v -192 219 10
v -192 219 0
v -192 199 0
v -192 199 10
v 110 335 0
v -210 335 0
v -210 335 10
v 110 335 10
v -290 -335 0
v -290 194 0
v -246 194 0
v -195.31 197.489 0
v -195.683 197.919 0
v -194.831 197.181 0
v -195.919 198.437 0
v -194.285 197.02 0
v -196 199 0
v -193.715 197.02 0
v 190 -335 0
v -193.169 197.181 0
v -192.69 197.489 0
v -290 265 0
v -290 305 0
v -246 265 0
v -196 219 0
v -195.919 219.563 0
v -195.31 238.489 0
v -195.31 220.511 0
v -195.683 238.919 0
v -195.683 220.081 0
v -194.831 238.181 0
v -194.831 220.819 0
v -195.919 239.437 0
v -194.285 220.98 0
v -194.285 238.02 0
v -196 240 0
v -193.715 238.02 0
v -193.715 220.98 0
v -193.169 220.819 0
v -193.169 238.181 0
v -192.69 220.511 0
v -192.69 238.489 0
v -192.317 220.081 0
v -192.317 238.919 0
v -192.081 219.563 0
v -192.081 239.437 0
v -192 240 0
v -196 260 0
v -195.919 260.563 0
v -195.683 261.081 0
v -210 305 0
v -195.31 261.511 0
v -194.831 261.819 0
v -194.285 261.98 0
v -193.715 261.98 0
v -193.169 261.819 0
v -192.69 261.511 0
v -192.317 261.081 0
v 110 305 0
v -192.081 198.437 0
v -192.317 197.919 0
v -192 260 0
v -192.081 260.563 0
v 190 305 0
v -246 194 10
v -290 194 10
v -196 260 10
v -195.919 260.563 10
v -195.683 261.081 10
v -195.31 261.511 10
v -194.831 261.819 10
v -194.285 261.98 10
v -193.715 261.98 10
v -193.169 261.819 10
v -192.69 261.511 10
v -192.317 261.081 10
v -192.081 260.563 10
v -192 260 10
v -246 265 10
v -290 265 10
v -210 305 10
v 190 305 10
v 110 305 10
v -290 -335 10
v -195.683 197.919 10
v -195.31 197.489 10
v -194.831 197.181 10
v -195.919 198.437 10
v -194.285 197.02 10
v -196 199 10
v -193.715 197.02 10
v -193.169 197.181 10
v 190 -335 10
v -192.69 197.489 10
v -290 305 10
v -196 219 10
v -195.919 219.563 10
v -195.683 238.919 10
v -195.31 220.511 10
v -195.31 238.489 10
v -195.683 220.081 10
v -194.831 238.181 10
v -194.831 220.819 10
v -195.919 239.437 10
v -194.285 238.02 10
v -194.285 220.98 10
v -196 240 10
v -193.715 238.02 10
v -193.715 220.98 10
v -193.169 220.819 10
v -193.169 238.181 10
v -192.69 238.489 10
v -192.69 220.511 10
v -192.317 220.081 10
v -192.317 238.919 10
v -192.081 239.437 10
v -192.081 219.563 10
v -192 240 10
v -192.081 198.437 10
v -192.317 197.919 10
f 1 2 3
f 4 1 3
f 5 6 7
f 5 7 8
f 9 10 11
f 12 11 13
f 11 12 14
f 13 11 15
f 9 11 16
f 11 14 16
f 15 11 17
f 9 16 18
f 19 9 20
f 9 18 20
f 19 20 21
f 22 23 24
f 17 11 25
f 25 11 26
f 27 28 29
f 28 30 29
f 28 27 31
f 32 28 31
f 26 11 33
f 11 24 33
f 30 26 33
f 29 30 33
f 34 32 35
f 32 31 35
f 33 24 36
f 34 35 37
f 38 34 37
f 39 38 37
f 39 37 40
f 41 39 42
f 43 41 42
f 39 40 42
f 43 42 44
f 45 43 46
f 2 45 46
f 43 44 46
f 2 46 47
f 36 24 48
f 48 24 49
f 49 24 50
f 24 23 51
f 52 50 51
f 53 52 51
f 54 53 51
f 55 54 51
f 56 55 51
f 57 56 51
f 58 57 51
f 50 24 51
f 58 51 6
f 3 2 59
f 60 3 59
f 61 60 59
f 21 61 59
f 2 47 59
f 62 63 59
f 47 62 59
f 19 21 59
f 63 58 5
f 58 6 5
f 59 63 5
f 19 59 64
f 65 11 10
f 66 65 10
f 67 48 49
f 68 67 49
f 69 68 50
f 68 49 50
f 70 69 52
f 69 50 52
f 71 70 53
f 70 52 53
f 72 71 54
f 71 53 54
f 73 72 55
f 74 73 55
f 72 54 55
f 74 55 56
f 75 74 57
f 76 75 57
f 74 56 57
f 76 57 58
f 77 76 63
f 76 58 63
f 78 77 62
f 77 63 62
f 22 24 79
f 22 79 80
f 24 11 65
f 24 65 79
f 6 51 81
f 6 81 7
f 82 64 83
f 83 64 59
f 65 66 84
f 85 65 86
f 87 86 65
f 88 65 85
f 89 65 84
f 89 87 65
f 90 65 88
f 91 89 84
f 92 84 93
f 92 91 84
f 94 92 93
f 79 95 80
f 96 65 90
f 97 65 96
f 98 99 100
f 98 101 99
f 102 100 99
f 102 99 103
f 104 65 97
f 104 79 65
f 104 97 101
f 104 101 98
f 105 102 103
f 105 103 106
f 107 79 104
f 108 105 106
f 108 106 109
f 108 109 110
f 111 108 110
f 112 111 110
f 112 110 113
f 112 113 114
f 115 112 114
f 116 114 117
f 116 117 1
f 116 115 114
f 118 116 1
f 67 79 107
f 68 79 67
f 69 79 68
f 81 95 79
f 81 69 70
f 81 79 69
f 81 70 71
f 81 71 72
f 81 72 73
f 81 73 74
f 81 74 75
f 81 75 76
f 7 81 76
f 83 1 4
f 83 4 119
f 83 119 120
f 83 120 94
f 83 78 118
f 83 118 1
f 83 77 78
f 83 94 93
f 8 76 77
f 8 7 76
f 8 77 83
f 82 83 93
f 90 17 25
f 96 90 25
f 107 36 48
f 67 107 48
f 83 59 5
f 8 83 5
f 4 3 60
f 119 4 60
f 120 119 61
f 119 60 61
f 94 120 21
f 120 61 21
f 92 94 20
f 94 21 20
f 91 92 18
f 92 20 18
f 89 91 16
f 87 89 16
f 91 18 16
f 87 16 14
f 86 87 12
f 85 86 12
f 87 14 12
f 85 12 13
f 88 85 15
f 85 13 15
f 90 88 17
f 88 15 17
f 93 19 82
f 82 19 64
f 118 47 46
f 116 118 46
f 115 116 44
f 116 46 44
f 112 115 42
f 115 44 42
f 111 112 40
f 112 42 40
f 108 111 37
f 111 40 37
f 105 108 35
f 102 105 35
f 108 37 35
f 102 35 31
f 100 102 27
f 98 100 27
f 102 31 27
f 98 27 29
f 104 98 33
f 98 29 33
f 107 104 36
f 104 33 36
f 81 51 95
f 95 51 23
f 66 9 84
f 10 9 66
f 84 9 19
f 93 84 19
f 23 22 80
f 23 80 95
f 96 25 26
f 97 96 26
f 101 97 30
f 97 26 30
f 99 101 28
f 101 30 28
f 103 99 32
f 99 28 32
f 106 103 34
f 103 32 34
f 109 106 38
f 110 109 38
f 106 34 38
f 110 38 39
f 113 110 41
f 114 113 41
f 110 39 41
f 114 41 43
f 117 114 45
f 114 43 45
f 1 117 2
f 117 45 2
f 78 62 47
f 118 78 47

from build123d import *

# Parameters (mm, degrees)
ESQUISSE1_W             = 480
ESQUISSE1_H             = 670
BOSS_EXTRU_1_DEPTH      = 10
ESQUISSE2_W             = 80
ESQUISSE2_H             = 30
ENL_V_MAT_EXTRU_1_DEPTH = 11
ESQUISSE3_W             = 44
ESQUISSE3_H             = 71
ENL_V_MAT_EXTRU_2_DEPTH = 11


with BuildPart() as part:
    # Esquisse1 → Boss.-Extru.1 (new body)
    with BuildSketch(Plane.XY):
        with Locations((-50, 0)):
            Rectangle(ESQUISSE1_W, ESQUISSE1_H)
    extrude(amount=BOSS_EXTRU_1_DEPTH)

    # Esquisse2 → Enlèv. mat.-Extru.1 (cut, through all)
    with BuildSketch(Plane(origin=(0, 0, 0), x_dir=(-1, 0, 0), z_dir=(0, 0, -1))):
        with Locations((-150, 320)):
            Rectangle(ESQUISSE2_W, ESQUISSE2_H)
        with Locations((250, 320)):
            Rectangle(ESQUISSE2_W, ESQUISSE2_H)
    extrude(amount=-ENL_V_MAT_EXTRU_1_DEPTH, mode=Mode.SUBTRACT)

    # Esquisse3 → Enlèv. mat.-Extru.2 (cut, through all)
    with BuildSketch(Plane(origin=(0, 0, 0), x_dir=(-1, 0, 0), z_dir=(0, 0, -1))):
        with BuildLine():
            Line((192, 260), (192, 240))
            ThreePointArc((192, 240), (194, 238), (196, 240))
            Line((196, 240), (196, 260))
            ThreePointArc((196, 260), (194, 262), (192, 260))
        make_face()
        with BuildLine():
            Line((192, 219), (192, 199))
            ThreePointArc((192, 199), (194, 197), (196, 199))
            Line((196, 199), (196, 219))
            ThreePointArc((196, 219), (194, 221), (192, 219))
        make_face()
        with Locations((268, 229.5)):
            Rectangle(ESQUISSE3_W, ESQUISSE3_H)
    extrude(amount=-ENL_V_MAT_EXTRU_2_DEPTH, mode=Mode.SUBTRACT)


solid = part.part
